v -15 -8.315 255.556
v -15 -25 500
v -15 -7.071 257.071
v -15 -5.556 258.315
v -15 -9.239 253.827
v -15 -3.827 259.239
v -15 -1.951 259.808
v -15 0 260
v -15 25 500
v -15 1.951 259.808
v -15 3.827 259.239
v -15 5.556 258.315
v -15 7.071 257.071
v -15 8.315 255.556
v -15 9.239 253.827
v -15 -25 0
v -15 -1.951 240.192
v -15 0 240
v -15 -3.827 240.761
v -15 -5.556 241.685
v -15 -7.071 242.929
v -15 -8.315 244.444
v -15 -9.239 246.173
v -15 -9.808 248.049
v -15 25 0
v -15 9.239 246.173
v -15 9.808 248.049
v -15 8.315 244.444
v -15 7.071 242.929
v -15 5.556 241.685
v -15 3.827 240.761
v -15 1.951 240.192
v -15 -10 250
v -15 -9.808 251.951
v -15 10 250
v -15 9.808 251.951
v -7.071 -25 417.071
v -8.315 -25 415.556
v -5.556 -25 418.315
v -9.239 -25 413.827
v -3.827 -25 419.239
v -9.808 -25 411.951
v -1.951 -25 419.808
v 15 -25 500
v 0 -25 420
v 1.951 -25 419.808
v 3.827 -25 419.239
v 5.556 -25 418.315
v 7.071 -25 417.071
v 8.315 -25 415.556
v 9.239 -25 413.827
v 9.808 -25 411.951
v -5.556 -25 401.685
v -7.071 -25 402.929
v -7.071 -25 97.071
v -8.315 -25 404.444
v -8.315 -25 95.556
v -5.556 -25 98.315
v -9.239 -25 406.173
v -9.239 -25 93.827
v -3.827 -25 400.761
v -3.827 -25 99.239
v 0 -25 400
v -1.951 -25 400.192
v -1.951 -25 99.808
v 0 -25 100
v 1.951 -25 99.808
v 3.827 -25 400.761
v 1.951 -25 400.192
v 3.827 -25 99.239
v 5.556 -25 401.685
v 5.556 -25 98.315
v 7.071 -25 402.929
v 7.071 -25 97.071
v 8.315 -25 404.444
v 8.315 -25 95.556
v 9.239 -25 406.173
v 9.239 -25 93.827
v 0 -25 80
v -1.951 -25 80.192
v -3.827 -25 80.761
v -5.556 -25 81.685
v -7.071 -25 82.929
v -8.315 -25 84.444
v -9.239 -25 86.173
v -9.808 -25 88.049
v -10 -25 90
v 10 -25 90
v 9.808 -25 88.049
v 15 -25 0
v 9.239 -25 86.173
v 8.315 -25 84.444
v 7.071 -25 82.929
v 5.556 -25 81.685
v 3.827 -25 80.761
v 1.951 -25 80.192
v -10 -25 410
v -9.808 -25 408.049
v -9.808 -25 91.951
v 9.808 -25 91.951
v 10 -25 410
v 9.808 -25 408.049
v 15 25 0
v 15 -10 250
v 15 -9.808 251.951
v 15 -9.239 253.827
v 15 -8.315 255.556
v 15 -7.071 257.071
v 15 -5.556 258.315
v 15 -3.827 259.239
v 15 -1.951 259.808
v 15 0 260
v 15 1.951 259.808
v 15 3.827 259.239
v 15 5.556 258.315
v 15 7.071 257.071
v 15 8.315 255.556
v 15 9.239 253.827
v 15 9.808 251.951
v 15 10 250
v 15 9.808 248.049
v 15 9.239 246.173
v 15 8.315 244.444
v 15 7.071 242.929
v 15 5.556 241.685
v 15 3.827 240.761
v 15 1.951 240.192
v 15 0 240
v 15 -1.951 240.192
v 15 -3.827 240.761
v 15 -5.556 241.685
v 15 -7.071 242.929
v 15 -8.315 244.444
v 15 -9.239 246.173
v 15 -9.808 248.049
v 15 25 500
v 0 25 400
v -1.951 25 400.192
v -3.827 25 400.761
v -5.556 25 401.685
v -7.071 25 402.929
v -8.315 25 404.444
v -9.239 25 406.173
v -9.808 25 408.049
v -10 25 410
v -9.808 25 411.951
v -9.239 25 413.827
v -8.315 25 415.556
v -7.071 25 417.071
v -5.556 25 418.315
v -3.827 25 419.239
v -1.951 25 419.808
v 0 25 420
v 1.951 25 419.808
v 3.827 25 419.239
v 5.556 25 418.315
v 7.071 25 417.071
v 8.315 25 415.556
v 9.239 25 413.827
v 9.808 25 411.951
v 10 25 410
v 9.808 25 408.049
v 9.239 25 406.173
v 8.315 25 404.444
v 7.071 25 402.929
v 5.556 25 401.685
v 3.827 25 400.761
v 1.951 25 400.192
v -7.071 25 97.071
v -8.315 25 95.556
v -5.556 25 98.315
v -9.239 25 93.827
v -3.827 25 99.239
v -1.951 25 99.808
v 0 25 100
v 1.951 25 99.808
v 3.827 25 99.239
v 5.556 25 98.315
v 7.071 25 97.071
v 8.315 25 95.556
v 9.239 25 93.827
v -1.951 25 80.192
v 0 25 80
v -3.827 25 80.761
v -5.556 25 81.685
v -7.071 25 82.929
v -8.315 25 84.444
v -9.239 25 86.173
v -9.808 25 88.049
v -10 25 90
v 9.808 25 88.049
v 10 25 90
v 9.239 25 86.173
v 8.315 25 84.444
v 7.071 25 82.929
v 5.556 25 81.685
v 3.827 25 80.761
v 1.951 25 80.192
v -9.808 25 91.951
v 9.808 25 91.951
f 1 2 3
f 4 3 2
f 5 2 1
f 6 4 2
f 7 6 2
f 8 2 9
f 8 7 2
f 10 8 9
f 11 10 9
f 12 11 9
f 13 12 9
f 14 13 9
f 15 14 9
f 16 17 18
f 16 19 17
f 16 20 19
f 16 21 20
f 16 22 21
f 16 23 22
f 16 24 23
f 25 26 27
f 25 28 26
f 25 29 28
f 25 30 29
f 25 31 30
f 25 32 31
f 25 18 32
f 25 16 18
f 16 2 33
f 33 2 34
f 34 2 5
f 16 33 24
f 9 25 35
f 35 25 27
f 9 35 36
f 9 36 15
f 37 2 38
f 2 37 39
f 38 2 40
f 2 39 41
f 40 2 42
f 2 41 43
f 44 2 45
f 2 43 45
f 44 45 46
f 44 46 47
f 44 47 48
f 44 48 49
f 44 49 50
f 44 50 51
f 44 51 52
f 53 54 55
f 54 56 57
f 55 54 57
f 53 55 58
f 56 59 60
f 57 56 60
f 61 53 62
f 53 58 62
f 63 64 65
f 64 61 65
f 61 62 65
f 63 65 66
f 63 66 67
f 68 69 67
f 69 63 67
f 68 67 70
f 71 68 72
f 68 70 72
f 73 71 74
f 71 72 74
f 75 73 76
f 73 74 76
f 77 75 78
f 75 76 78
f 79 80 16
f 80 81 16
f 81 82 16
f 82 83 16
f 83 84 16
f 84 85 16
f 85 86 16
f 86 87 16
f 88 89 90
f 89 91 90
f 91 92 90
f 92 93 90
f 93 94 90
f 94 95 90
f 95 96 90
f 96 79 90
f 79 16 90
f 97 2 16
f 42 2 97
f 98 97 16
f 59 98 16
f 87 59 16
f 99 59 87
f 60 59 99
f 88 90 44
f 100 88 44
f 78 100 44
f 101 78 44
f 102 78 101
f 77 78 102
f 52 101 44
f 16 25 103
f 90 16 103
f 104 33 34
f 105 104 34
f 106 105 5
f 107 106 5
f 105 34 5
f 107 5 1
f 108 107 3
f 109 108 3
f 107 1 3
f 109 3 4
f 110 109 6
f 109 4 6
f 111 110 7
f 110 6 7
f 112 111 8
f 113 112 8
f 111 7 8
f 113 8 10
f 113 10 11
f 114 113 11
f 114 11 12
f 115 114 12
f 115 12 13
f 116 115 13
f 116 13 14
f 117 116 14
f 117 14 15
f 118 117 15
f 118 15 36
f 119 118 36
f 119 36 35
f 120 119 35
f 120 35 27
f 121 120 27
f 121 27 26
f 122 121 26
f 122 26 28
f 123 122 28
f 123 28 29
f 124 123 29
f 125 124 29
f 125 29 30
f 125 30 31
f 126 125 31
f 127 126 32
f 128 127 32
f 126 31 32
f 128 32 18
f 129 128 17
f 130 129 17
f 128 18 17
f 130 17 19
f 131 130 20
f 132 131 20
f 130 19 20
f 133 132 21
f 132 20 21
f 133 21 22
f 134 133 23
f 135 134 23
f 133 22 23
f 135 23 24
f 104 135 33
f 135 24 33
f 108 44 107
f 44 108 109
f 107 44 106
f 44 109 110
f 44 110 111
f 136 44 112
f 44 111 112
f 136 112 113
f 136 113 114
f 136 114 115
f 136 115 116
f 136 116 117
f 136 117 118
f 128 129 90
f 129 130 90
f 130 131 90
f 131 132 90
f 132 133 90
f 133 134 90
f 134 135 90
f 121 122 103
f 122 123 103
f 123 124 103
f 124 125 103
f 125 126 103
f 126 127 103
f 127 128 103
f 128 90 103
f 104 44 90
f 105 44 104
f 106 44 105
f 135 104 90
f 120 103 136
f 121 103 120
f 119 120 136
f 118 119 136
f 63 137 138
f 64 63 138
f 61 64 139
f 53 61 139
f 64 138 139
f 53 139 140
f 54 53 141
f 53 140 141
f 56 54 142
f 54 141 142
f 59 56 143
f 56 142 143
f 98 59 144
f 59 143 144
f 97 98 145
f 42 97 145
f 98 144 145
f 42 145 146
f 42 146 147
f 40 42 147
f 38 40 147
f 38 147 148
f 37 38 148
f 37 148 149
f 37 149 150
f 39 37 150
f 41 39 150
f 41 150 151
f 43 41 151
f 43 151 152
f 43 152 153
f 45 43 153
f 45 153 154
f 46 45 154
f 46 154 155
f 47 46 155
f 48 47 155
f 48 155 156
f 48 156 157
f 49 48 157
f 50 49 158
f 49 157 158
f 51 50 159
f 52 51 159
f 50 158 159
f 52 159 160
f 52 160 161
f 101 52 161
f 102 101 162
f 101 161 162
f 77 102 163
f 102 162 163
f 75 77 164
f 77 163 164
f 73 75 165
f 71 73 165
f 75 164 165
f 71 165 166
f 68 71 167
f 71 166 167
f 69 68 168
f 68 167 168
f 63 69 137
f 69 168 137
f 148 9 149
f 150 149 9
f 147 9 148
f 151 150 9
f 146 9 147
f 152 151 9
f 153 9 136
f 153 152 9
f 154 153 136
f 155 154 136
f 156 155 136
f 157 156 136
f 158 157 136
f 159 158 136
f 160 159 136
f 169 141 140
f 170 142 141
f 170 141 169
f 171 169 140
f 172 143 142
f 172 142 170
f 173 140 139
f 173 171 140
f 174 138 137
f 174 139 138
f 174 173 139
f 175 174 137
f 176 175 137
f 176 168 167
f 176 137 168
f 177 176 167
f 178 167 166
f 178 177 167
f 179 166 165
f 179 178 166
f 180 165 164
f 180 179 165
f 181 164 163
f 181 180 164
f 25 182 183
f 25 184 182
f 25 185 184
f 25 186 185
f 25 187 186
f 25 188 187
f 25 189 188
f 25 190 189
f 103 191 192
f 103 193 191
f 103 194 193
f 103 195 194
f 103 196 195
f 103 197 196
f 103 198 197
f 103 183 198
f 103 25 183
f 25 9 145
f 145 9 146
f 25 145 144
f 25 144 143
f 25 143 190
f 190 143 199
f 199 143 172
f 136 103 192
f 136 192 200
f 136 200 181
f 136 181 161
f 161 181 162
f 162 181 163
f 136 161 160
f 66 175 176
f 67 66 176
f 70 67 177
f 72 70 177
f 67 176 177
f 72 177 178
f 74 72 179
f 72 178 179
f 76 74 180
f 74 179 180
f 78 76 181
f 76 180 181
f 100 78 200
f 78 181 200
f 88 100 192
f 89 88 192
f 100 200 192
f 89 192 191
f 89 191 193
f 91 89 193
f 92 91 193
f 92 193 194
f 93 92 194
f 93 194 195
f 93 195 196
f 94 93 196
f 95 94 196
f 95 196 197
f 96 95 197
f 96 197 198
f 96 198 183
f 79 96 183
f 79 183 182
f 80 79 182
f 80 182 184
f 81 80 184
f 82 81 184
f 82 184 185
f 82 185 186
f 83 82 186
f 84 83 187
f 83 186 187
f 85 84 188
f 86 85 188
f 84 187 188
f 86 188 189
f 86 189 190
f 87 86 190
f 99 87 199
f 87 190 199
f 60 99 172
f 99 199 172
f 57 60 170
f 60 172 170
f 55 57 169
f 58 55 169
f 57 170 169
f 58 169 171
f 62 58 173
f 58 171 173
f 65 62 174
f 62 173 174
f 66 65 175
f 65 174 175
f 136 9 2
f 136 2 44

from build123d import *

# Parameters (mm, degrees)
SKETCH_1_W          = 30
SKETCH_1_H          = 50
EXTRUDE_1_DEPTH     = 500
SKETCH_2_R          = 10
CUT_EXTRUDE_1_DEPTH = 503.717614571
SKETCH_3_R          = 10
CUT_EXTRUDE_2_DEPTH = 502.522681441


with BuildPart() as part:
    # Эскиз1 → Бобышка-Вытянуть1 (new body)
    with BuildSketch(Plane.XY):
        Rectangle(SKETCH_1_W, SKETCH_1_H)
    extrude(amount=EXTRUDE_1_DEPTH)

    # Эскиз2 → Вырез-Вытянуть1 (cut, through all)
    with BuildSketch(Plane(origin=(0, 25, 0), x_dir=(1, 0, 0), z_dir=(0, 1, 0))):
        with Locations(Location((0, -90, 0), (0, 0, 270))):
            Circle(SKETCH_2_R)
        with Locations(Location((0, -410, 0), (0, 0, 90))):
            Circle(SKETCH_2_R)
    extrude(amount=-CUT_EXTRUDE_1_DEPTH, mode=Mode.SUBTRACT)

    # Эскиз3 → Вырез-Вытянуть2 (cut, through all)
    with BuildSketch(Plane.ZY.offset(15)):
        with Locations(Location((250, 0, 0), (0, 0, 270))):
            Circle(SKETCH_3_R)
    extrude(amount=-CUT_EXTRUDE_2_DEPTH, mode=Mode.SUBTRACT)


solid = part.part
